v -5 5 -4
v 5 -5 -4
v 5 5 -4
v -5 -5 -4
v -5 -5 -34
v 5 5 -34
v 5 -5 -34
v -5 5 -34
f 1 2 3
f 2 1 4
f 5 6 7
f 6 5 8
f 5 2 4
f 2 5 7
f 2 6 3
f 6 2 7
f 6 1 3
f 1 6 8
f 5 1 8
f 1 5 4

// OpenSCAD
handle_length = 30;

x_target = 10;
y_target = 10;
z_target = 4;

x_pic = 500;
y_pic = 467;
z_pic = 100;

x_scale = x_target/x_pic;
echo("x_scale: ", x_scale);

y_scale = y_target/y_pic;
echo("y_scale: ", y_scale);

z_scale = z_target/z_pic;
echo("z_scale: ", z_scale);

scale([x_scale, y_scale, z_scale])
    surface( file = "starfish-bw-500x467.png", center = true, invert = true);
    
translate([0, 0, -z_target-handle_length/2])
    cube([x_target, y_target, handle_length], center = true);
    
